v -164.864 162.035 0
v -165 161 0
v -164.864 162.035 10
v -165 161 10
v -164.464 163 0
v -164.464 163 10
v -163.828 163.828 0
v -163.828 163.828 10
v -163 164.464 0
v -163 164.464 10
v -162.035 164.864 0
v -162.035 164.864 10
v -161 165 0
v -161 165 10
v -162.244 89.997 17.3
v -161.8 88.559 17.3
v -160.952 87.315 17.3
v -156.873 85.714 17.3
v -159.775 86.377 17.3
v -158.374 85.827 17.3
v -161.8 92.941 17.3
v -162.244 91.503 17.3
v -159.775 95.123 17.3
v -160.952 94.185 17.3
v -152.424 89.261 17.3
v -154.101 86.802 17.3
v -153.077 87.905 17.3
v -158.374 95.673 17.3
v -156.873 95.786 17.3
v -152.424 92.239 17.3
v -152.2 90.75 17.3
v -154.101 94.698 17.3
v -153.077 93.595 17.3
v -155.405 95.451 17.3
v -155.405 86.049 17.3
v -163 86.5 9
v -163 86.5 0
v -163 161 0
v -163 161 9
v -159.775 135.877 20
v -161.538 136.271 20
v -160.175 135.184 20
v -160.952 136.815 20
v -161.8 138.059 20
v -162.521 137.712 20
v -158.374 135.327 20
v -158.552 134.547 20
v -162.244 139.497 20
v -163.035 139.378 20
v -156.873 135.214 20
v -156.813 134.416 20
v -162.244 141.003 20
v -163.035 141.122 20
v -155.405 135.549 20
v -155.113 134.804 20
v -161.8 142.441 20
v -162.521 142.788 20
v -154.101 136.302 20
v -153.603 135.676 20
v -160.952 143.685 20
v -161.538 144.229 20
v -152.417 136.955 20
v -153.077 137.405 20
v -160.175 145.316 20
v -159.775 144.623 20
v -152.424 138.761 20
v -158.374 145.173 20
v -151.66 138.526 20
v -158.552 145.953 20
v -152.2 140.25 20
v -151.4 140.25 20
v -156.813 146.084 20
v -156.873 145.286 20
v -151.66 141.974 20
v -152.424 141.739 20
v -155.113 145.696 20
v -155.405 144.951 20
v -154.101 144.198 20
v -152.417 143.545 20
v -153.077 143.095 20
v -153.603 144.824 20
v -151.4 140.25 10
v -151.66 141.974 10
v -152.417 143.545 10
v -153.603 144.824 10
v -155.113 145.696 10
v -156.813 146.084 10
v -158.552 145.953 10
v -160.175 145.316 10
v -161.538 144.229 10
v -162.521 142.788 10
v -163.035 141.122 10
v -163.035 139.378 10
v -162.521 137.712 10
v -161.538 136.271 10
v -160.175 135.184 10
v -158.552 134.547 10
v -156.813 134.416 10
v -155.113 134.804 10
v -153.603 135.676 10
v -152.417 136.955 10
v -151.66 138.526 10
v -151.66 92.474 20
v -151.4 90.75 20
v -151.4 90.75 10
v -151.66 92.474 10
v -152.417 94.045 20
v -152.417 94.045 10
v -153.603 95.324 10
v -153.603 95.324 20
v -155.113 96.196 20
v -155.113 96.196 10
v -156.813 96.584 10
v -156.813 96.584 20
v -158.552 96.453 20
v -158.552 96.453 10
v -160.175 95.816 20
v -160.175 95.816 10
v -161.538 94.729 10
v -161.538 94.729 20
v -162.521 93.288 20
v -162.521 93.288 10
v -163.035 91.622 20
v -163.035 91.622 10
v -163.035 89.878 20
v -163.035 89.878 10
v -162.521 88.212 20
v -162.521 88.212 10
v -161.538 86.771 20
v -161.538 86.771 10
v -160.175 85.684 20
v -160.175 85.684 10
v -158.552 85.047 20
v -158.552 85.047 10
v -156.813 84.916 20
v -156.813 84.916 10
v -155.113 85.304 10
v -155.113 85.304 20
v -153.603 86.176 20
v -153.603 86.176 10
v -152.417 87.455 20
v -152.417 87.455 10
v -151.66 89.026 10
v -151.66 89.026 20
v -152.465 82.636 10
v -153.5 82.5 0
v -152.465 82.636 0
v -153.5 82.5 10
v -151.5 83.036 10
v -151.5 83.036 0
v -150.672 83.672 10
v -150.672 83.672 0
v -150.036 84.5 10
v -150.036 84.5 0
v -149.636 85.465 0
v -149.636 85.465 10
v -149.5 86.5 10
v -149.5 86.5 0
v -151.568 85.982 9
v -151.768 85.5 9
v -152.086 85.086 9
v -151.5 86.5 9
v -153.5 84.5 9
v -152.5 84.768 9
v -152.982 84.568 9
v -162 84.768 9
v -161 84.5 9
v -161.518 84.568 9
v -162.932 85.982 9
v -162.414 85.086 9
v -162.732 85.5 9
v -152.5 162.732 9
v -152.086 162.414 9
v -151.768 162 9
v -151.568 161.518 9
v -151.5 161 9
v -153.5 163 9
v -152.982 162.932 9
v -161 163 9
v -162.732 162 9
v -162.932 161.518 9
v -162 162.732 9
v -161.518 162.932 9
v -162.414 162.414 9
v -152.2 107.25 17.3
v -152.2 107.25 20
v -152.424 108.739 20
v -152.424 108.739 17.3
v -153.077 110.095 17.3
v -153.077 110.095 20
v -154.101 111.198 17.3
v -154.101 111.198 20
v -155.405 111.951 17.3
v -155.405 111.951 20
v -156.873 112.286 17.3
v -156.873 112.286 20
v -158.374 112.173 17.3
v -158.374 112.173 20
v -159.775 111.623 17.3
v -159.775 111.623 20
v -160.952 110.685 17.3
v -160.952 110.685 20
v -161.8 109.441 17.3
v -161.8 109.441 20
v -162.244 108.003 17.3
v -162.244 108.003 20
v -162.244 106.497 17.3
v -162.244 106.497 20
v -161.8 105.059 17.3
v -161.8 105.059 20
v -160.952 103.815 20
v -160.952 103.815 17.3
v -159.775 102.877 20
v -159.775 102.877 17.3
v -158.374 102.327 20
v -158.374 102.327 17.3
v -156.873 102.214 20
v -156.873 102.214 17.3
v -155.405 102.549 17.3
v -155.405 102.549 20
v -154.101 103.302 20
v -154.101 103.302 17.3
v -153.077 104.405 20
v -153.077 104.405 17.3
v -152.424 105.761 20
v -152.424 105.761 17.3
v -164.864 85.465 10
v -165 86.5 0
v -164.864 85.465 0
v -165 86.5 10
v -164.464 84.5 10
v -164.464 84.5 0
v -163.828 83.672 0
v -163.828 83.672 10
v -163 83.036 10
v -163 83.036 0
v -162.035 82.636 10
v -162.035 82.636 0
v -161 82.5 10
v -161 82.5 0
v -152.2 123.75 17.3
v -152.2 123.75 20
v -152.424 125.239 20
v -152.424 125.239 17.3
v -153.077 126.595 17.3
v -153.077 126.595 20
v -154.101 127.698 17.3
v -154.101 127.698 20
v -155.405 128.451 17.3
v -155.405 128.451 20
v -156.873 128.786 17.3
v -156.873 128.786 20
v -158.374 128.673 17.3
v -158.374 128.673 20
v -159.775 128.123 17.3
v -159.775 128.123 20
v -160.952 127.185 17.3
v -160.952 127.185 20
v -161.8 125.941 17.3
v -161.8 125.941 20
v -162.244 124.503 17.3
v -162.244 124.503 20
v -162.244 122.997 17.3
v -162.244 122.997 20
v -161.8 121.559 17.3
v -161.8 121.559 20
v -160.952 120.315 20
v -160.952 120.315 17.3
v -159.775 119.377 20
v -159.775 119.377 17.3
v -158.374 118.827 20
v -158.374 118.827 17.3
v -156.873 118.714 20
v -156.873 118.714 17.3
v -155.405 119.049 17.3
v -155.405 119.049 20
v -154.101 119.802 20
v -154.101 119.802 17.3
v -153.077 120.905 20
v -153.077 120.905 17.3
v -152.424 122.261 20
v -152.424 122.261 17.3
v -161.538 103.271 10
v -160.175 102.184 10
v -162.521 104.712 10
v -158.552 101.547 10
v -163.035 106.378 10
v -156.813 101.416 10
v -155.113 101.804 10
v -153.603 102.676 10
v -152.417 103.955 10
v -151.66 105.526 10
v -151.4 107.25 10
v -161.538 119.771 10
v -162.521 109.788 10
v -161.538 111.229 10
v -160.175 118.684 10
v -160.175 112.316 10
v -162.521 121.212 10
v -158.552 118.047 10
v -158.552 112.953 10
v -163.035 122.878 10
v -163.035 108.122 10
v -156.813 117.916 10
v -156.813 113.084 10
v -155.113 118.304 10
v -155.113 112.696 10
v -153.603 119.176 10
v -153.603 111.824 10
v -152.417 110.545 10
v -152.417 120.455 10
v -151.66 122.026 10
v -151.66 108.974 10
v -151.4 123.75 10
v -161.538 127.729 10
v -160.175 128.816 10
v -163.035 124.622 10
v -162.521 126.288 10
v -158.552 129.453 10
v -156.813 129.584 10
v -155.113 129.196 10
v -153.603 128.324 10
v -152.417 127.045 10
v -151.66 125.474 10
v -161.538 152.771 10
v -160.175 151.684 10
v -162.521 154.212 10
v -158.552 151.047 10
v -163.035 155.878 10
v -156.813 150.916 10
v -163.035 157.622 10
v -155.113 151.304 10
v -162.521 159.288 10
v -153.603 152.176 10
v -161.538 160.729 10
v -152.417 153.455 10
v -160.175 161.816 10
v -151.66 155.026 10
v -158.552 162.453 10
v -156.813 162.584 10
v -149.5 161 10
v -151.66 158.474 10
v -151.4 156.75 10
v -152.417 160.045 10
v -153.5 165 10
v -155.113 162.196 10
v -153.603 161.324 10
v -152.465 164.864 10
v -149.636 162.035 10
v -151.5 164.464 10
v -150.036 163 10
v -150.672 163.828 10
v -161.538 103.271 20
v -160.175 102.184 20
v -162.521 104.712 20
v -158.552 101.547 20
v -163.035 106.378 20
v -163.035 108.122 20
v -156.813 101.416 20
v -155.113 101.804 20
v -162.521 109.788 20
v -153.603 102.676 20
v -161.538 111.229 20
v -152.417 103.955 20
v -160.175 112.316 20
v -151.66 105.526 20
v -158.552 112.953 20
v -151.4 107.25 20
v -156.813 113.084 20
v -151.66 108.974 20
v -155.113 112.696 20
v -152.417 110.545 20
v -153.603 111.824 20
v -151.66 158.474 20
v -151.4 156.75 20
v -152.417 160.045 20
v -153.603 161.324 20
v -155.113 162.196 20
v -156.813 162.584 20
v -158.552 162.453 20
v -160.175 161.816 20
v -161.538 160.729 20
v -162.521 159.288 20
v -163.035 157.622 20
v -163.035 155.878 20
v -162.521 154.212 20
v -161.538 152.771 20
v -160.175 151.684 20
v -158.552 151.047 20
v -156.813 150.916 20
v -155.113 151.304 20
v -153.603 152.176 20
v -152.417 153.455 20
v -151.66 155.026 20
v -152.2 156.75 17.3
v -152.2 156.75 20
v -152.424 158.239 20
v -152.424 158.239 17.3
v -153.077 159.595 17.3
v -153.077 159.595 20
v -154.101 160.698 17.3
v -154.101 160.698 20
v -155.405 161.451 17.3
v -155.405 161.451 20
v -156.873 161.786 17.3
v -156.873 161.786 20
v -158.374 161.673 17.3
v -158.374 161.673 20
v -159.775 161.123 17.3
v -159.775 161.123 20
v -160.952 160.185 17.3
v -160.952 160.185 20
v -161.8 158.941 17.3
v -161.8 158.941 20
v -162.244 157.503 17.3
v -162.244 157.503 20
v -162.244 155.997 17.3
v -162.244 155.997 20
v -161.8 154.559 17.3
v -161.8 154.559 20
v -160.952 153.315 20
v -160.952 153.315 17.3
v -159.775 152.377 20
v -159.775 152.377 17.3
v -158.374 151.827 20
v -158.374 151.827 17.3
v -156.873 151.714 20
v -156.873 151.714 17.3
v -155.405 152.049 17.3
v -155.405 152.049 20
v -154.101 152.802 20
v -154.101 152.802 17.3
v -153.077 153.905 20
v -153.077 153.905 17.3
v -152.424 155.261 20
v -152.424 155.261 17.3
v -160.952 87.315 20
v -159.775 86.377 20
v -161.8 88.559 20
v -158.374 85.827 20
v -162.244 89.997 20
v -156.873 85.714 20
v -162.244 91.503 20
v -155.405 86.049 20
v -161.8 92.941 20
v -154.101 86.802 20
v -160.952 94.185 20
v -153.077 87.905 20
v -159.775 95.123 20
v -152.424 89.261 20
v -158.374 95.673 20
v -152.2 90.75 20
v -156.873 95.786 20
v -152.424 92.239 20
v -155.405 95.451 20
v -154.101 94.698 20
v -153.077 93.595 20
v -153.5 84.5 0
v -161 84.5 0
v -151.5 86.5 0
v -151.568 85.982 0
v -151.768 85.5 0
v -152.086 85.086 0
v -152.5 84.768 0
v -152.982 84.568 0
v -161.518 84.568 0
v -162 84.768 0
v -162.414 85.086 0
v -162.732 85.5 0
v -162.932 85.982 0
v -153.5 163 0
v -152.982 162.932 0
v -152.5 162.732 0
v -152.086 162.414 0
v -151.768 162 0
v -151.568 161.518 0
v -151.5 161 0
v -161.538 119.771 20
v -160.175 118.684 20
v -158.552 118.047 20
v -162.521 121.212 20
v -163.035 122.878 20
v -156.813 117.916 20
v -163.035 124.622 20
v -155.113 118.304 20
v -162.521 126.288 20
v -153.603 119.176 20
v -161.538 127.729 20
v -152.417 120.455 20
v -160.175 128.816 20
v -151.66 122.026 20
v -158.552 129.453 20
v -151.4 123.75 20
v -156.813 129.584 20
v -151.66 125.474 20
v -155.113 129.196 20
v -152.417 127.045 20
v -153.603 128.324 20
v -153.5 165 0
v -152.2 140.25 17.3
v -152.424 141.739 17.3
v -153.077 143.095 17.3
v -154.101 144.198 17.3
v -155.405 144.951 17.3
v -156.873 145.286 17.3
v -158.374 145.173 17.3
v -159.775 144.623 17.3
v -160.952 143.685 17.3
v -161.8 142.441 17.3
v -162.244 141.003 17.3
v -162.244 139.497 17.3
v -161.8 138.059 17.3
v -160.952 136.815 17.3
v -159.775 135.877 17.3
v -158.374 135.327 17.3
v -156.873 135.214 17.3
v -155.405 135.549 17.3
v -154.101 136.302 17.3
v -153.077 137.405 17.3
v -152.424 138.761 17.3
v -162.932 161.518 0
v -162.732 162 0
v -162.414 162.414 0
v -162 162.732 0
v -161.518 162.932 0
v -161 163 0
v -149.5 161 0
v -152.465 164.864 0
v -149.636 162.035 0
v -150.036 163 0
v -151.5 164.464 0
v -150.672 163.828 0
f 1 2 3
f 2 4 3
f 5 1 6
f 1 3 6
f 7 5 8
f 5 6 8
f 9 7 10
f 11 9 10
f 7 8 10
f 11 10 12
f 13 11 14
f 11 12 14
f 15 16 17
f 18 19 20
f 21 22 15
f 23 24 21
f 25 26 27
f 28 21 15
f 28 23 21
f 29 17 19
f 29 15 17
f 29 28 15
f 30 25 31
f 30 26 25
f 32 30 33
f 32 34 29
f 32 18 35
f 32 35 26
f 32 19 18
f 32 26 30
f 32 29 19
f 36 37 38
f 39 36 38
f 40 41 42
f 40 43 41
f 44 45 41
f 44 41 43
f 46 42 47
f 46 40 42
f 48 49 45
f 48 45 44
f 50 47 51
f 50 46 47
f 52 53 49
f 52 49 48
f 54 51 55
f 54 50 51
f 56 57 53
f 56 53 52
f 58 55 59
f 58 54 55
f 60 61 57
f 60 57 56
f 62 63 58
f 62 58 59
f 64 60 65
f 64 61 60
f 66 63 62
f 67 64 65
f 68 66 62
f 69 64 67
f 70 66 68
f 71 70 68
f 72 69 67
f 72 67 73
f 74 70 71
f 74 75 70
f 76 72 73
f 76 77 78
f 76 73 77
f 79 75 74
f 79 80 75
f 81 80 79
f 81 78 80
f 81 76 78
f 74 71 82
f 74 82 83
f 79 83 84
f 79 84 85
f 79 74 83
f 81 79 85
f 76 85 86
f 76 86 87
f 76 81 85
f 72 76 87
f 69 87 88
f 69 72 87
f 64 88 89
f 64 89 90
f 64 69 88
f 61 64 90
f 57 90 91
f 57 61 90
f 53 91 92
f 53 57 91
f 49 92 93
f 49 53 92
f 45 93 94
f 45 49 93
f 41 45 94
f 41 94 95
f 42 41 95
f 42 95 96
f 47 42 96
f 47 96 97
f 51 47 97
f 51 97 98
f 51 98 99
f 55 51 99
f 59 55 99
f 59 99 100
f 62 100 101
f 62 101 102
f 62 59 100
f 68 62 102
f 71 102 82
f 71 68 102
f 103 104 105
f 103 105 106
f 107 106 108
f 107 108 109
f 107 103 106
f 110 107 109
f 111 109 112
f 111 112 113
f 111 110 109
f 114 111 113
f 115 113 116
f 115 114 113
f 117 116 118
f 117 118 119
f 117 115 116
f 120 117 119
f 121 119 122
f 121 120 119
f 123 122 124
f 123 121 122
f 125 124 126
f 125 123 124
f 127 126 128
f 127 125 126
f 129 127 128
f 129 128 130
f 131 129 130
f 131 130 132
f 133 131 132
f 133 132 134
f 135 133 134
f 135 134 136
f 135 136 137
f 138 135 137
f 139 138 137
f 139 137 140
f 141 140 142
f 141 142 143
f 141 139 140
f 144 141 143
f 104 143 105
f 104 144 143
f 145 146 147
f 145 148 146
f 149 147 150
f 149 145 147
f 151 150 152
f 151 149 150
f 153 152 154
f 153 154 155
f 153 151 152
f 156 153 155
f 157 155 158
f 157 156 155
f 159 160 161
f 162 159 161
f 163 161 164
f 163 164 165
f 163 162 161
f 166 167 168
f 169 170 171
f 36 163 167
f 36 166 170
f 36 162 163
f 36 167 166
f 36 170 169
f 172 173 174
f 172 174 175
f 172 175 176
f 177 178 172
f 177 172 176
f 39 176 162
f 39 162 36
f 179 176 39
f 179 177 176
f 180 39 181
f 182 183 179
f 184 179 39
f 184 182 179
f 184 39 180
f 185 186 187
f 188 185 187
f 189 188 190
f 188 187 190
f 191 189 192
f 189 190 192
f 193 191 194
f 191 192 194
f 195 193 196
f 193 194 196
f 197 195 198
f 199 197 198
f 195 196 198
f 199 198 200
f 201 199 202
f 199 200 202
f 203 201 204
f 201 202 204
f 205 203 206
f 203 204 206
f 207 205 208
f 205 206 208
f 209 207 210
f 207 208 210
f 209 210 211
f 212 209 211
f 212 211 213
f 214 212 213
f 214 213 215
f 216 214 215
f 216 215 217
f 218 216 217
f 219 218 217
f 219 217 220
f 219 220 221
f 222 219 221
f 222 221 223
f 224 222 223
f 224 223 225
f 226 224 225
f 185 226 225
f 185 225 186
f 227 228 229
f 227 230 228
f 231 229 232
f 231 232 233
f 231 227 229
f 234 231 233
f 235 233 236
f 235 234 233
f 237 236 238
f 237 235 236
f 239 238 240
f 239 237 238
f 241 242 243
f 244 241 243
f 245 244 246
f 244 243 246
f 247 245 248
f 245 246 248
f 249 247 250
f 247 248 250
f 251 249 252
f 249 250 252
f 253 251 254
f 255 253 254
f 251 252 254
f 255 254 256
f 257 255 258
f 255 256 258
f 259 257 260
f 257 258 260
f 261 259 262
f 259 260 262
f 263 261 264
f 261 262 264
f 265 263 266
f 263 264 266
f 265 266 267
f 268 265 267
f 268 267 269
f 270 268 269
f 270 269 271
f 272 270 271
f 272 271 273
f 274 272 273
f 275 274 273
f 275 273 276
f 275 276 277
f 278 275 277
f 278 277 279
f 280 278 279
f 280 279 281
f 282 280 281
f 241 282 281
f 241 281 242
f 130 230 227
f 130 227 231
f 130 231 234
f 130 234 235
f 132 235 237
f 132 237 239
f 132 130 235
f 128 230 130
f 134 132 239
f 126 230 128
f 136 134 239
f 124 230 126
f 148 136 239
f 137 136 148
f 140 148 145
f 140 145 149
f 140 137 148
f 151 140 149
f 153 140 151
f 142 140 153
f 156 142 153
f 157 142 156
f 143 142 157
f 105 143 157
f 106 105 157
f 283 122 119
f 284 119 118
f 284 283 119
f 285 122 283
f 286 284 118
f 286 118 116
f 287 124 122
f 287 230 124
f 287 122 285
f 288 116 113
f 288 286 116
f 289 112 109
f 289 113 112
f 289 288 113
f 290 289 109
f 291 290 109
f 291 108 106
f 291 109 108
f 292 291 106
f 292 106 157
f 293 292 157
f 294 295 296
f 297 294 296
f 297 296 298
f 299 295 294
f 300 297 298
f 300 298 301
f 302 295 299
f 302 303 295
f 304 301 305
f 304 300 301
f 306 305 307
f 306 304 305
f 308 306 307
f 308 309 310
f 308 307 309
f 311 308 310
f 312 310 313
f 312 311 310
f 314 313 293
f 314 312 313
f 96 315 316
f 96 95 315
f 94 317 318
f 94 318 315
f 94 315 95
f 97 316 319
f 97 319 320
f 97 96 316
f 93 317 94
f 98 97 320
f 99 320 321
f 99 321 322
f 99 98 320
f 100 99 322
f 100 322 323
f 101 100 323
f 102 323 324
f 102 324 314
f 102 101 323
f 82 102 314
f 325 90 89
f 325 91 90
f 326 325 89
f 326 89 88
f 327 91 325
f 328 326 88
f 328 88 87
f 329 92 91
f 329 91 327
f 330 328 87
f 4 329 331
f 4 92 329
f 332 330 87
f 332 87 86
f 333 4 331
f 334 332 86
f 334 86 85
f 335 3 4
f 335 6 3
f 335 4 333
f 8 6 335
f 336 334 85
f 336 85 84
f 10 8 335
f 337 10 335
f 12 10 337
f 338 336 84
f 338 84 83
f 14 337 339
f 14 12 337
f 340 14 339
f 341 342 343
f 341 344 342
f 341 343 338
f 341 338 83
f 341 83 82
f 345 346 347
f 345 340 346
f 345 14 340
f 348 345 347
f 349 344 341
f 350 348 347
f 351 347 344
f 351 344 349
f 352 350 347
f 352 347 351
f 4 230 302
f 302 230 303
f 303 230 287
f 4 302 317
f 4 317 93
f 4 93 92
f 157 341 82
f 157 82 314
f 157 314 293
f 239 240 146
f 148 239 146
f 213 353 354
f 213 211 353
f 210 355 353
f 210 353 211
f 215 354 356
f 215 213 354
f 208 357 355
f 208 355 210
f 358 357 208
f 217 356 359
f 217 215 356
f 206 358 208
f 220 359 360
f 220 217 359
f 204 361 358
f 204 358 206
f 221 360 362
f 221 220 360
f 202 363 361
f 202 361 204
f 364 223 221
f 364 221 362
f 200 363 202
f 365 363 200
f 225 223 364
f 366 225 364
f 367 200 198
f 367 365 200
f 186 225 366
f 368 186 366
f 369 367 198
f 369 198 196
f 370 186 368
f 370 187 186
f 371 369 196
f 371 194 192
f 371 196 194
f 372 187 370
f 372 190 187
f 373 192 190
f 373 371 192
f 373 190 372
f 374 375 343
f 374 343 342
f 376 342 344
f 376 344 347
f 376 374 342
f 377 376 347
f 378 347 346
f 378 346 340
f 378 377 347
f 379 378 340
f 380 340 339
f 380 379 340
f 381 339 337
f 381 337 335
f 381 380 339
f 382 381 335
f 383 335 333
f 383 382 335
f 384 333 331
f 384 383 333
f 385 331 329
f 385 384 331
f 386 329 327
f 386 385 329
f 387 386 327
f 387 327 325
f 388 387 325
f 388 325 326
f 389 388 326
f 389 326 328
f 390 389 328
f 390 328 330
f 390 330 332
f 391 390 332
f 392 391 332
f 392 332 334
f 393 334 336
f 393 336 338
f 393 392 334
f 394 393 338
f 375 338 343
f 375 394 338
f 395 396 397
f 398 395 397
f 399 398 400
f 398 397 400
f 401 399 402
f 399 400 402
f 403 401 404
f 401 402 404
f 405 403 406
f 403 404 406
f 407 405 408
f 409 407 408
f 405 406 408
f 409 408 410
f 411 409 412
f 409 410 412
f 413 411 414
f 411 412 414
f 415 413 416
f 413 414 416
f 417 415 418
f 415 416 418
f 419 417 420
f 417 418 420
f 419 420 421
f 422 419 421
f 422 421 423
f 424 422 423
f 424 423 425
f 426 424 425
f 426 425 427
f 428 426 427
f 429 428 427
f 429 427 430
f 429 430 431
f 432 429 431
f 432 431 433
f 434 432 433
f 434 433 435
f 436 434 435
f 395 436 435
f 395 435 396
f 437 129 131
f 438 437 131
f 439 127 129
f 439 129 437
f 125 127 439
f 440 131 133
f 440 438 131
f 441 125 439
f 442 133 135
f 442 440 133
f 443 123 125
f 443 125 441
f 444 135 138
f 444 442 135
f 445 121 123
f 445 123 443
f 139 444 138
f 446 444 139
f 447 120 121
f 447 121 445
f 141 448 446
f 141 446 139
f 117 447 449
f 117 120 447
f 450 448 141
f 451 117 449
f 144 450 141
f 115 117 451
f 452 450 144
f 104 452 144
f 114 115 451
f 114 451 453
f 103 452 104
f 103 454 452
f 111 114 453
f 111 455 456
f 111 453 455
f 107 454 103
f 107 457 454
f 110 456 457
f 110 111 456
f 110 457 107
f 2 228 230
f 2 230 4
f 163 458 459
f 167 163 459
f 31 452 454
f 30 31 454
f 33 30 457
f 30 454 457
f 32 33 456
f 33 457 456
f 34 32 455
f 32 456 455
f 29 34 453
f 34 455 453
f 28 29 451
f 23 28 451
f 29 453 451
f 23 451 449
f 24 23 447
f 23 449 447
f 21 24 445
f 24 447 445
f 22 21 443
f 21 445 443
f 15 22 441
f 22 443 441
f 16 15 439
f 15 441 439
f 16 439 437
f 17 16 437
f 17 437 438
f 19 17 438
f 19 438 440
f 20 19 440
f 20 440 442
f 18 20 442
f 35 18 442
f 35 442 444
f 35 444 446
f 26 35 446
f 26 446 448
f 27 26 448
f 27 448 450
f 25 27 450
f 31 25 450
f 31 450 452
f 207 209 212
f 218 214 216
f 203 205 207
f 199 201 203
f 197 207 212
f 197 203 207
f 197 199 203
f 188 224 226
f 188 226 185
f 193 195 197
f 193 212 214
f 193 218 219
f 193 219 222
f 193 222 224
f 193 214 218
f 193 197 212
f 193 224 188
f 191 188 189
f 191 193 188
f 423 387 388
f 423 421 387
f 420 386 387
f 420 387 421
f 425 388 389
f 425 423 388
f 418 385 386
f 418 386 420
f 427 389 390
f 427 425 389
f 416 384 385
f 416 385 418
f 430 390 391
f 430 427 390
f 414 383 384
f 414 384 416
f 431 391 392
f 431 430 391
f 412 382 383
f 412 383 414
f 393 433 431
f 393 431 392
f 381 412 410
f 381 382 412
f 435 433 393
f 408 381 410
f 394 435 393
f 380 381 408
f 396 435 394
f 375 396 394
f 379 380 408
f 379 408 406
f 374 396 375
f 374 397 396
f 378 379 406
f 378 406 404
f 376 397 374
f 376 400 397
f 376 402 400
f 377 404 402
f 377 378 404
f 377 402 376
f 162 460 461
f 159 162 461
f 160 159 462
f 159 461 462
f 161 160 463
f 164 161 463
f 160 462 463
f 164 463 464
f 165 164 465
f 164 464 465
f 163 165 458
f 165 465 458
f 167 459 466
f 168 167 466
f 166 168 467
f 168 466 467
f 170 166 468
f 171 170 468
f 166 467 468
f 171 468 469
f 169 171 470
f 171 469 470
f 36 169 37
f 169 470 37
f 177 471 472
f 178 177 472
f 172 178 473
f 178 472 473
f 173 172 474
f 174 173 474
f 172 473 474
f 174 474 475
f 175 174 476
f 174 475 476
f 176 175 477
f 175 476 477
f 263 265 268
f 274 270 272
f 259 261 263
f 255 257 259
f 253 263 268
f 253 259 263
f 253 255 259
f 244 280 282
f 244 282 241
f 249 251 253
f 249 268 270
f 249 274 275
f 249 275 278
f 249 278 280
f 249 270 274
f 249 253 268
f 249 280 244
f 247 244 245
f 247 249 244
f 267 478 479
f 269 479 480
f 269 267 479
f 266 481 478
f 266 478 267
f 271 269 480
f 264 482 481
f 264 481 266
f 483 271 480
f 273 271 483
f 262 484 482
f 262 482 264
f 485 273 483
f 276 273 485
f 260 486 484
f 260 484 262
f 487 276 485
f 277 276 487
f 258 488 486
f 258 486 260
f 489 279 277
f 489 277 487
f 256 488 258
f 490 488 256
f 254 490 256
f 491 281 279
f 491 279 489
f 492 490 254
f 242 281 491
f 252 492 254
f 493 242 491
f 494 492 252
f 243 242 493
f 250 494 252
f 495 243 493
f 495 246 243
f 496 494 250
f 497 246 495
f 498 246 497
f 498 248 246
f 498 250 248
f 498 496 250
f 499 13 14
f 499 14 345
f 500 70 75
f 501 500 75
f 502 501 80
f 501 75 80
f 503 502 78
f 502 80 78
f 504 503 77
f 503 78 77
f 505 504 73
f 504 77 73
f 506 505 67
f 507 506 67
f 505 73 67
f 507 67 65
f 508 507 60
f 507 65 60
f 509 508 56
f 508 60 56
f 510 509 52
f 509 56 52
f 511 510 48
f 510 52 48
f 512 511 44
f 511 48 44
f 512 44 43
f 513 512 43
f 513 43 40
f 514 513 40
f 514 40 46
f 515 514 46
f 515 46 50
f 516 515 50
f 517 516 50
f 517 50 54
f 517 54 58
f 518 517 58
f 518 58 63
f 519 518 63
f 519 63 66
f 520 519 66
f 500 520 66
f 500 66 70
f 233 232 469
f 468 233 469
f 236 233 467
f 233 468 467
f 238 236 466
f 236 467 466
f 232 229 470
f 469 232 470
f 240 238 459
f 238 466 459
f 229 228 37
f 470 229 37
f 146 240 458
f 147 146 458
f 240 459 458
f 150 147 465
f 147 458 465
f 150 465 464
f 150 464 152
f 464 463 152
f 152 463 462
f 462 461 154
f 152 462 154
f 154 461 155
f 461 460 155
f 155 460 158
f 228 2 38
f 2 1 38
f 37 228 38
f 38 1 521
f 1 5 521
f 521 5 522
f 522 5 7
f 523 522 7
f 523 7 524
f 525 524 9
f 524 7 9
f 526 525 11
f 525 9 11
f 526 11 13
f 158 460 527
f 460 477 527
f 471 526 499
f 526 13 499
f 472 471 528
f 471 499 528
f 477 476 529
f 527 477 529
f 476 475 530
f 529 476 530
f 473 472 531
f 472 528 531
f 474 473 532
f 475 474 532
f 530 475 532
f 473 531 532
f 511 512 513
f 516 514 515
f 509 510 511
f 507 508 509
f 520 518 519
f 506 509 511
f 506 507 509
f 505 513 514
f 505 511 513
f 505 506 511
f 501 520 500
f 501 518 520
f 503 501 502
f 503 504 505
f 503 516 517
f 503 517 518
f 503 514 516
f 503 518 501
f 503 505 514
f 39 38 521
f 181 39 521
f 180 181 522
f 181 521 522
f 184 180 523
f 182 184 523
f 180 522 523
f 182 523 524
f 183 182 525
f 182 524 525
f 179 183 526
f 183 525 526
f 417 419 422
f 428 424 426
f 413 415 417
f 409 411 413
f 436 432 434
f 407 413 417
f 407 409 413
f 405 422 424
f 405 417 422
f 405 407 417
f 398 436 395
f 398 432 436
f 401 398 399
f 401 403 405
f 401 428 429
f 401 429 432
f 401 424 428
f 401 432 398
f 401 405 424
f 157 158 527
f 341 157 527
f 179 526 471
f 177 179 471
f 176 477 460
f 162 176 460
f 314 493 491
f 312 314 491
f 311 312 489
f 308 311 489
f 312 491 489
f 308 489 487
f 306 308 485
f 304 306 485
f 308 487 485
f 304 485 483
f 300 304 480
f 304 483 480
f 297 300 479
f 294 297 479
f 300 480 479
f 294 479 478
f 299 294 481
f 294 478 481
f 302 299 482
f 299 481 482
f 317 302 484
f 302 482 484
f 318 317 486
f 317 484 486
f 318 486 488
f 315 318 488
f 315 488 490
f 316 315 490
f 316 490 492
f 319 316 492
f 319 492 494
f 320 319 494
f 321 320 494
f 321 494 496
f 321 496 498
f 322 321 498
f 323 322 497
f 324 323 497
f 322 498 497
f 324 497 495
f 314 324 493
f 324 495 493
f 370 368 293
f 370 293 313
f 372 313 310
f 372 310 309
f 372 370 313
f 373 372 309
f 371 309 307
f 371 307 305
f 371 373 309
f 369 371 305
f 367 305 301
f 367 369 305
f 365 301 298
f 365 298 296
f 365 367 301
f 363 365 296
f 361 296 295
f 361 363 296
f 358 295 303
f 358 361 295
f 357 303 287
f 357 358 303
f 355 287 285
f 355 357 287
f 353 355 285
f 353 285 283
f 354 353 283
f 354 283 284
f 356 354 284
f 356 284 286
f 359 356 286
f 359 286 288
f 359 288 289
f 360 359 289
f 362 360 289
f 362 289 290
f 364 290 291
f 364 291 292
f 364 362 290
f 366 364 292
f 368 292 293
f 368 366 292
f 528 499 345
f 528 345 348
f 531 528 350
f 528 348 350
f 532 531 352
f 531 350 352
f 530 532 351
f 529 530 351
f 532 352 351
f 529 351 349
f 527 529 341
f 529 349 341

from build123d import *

# Parameters (mm, degrees)
SKETCH1_W                       = 15.5
SKETCH1_H                       = 82.5
BOSS_EXTRUDE1_DEPTH             = 20
SKETCH2_R                       = 5.85
SKETCH2_R_2                     = 5.05
CUT_EXTRUDE1_DEPTH              = 10
FILLET1_R                       = 4
SKIZZE3_R                       = 5.1
SKIZZE3_R_2                     = 5.05
AUFSATZ_LINEAR_AUSTRAGEN1_DEPTH = 7.3
SCHNITT_LINEAR_AUSTRAGEN1_DEPTH = 9


with BuildPart() as part:
    # Sketch1 → Boss-Extrude1 (new body)
    with BuildSketch(Plane.XY):
        with Locations((-157.25, 123.75)):
            Rectangle(SKETCH1_W, SKETCH1_H)
    extrude(amount=BOSS_EXTRUDE1_DEPTH)

    # Sketch2 → Cut-Extrude1 (cut)
    with BuildSketch(Plane.XY.offset(20)):
        with BuildLine():
            ThreePointArc((-163.1, 123.75), (-157.25, 129.6), (-151.4, 123.75))
            Line((-151.4, 123.75), (-149.5, 123.75))
            Line((-149.5, 123.75), (-149.5, 165))
            Line((-149.5, 165), (-165, 165))
            Line((-165, 165), (-165, 123.75))
            Line((-165, 123.75), (-163.1, 123.75))
        make_face()
        with Locations((-157.25, 140.25)):
            Circle(SKETCH2_R, mode=Mode.SUBTRACT)
        with Locations((-157.25, 156.75)):
            Circle(SKETCH2_R, mode=Mode.SUBTRACT)
        with BuildLine():
            Line((-149.5, 123.75), (-151.4, 123.75))
            ThreePointArc((-151.4, 123.75), (-157.25, 117.9), (-163.1, 123.75))
            Line((-163.1, 123.75), (-165, 123.75))
            Line((-165, 123.75), (-165, 82.5))
            Line((-165, 82.5), (-149.5, 82.5))
            Line((-149.5, 82.5), (-149.5, 123.75))
        make_face()
        with Locations((-157.25, 90.75)):
            Circle(SKETCH2_R, mode=Mode.SUBTRACT)
        with Locations((-157.25, 107.25)):
            Circle(SKETCH2_R, mode=Mode.SUBTRACT)
        with Locations((-157.25, 90.75)):
            Circle(SKETCH2_R_2)
        with Locations((-157.25, 107.25)):
            Circle(SKETCH2_R_2)
        with BuildLine():
            ThreePointArc((-162.3, 123.75), (-157.25, 118.7), (-152.2, 123.75))
            Line((-152.2, 123.75), (-162.3, 123.75))
        make_face()
        with BuildLine():
            Line((-162.3, 123.75), (-152.2, 123.75))
            ThreePointArc((-152.2, 123.75), (-157.25, 128.8), (-162.3, 123.75))
        make_face()
        with Locations((-157.25, 140.25)):
            Circle(SKETCH2_R_2)
        with Locations((-157.25, 156.75)):
            Circle(SKETCH2_R_2)
    extrude(amount=-CUT_EXTRUDE1_DEPTH, mode=Mode.SUBTRACT)

    # Fillet1
    fillet1_edges = [part.edges().sort_by_distance(p)[0] for p in [
        (-165, 165, 5),
        (-149.5, 165, 5),
        (-149.5, 82.5, 5),
        (-165, 82.5, 5),
    ]]
    fillet(fillet1_edges, radius=FILLET1_R)

    # Skizze3 → Aufsatz-Linear austragen1 (add)
    with BuildSketch(Plane.XY.offset(10)):
        with Locations((-157.25, 156.75)):
            Circle(SKIZZE3_R)
        with Locations((-157.25, 140.25)):
            Circle(SKIZZE3_R)
        with Locations((-157.25, 123.75)):
            Circle(SKIZZE3_R_2)
        with Locations((-157.25, 107.25)):
            Circle(SKIZZE3_R_2)
        with Locations((-157.25, 90.75)):
            Circle(SKIZZE3_R)
    extrude(amount=AUFSATZ_LINEAR_AUSTRAGEN1_DEPTH)

    # Skizze4 → Schnitt-Linear austragen1 (cut)
    with BuildSketch(Plane(origin=(0, 0, 0), x_dir=(-1, 0, 0), z_dir=(0, 0, -1))):
        with BuildLine():
            Line((161, 163), (153.5, 163))
            ThreePointArc((153.5, 163), (152.085786438, 162.414213562), (151.5, 161))
            Line((151.5, 161), (151.5, 86.5))
            ThreePointArc((151.5, 86.5), (152.085786438, 85.085786438), (153.5, 84.5))
            Line((153.5, 84.5), (161, 84.5))
            ThreePointArc((161, 84.5), (162.414213562, 85.085786438), (163, 86.5))
            Line((163, 86.5), (163, 161))
            ThreePointArc((163, 161), (162.414213562, 162.414213562), (161, 163))
        make_face()
    extrude(amount=-SCHNITT_LINEAR_AUSTRAGEN1_DEPTH, mode=Mode.SUBTRACT)


solid = part.part
